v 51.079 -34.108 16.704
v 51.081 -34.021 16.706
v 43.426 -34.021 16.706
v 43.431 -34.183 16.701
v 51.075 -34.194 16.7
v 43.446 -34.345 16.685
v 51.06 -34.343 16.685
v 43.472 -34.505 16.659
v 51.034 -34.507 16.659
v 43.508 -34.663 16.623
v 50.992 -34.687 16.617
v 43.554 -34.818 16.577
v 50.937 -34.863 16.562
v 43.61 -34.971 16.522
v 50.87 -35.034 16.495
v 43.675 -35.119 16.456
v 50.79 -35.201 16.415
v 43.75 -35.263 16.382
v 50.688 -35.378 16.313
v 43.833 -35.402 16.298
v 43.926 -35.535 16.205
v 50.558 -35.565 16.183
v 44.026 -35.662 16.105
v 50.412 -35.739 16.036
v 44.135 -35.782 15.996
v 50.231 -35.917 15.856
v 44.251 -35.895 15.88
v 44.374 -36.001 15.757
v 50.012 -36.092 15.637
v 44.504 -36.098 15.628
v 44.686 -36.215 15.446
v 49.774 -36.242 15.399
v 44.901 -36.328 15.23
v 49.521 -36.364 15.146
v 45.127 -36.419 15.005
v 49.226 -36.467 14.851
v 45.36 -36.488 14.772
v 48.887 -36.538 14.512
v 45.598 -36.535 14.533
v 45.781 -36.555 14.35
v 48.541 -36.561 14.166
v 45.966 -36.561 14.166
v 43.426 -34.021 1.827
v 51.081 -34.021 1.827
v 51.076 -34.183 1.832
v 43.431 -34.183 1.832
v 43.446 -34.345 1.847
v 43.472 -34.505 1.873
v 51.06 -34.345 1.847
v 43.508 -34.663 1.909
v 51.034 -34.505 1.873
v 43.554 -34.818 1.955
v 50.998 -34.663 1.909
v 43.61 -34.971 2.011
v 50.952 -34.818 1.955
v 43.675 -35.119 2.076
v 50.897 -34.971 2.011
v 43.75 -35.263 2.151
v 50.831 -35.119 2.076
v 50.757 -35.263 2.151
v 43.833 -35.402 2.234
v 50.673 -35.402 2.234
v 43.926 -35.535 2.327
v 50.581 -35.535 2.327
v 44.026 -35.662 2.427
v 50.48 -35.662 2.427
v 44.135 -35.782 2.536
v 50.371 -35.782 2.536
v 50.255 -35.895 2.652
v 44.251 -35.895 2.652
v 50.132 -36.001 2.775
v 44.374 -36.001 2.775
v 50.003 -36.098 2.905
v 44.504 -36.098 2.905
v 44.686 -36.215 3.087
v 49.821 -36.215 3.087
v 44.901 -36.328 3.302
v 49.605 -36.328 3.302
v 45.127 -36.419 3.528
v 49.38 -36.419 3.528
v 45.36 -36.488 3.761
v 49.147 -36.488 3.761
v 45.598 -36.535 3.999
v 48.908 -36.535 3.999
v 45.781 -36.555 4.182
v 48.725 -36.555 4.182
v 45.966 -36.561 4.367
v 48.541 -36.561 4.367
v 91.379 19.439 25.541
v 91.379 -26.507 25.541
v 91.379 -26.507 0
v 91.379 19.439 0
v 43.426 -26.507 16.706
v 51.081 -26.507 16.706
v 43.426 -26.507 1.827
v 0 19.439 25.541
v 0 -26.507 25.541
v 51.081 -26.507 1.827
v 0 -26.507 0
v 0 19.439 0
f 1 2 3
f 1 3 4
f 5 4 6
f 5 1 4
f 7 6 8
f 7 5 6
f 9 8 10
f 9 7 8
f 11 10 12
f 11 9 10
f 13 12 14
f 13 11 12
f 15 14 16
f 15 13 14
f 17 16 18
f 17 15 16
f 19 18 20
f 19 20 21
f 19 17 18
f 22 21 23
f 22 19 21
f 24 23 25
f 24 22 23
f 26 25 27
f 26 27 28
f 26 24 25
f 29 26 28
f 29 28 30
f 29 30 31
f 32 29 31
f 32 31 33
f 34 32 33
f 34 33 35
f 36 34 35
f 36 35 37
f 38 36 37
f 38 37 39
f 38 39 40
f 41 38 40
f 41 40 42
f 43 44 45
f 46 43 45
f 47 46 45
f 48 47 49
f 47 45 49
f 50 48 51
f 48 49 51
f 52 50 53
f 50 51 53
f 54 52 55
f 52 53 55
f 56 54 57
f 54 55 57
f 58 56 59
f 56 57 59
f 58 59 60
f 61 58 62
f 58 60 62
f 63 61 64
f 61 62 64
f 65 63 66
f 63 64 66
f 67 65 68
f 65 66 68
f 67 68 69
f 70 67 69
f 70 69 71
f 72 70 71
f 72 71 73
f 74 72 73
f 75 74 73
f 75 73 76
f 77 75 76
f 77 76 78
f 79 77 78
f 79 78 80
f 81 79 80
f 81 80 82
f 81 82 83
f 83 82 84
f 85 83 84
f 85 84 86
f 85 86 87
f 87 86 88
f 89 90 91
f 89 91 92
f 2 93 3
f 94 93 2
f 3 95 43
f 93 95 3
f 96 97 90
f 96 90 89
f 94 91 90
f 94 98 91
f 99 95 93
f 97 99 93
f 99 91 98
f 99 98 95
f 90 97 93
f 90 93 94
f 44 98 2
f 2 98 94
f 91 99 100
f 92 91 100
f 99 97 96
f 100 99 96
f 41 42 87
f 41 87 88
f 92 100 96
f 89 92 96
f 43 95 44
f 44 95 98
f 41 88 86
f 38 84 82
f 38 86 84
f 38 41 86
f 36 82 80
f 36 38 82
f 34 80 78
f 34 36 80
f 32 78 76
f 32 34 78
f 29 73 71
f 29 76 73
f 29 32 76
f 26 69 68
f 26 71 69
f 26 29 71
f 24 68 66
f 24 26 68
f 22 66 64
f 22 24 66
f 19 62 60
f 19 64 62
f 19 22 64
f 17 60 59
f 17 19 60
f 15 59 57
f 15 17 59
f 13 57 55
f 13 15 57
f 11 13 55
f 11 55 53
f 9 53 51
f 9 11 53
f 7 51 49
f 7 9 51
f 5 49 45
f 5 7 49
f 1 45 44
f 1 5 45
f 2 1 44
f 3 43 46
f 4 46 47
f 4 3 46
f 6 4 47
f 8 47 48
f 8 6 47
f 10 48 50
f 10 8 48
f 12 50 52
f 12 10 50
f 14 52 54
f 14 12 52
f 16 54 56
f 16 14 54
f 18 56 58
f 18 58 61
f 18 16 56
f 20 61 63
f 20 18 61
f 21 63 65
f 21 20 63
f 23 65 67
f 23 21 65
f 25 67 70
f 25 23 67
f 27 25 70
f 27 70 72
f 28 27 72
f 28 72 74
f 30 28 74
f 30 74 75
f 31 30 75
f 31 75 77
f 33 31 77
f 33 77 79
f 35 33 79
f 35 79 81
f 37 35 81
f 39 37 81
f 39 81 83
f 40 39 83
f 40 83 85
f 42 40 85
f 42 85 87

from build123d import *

# Parameters (mm, degrees)
F0_W     = 45.945797
F0_H     = 25.540538
F1_DEPTH = 91.379464
F2_W     = 7.655218
F2_H     = 14.879167
F3_DEPTH = 10.054348
F4_R     = 2.54


with BuildPart() as f1:
    # F0 (on Right) → F1 (new body)
    with BuildSketch(Plane.YZ):
        with Locations((-3.534025, 12.770269)):
            Rectangle(F0_W, F0_H)
    extrude(amount=F1_DEPTH)

    # F2 (on face) → F3 (join)
    with BuildSketch(Plane.XZ.offset(26.506923)):
        with Locations((47.253132, 9.266093)):
            Rectangle(F2_W, F2_H)
    extrude(amount=F3_DEPTH)

    # F4
    f4_edges = [f1.edges().sort_by_distance(p)[0] for p in [
        (43.425523, -36.561271, 9.266093),
        (47.253132, -36.561271, 1.82651),
        (51.080741, -36.561271, 9.266093),
        (47.253132, -36.561271, 16.705677),
    ]]
    fillet(f4_edges, radius=F4_R)


solid = f1.part
